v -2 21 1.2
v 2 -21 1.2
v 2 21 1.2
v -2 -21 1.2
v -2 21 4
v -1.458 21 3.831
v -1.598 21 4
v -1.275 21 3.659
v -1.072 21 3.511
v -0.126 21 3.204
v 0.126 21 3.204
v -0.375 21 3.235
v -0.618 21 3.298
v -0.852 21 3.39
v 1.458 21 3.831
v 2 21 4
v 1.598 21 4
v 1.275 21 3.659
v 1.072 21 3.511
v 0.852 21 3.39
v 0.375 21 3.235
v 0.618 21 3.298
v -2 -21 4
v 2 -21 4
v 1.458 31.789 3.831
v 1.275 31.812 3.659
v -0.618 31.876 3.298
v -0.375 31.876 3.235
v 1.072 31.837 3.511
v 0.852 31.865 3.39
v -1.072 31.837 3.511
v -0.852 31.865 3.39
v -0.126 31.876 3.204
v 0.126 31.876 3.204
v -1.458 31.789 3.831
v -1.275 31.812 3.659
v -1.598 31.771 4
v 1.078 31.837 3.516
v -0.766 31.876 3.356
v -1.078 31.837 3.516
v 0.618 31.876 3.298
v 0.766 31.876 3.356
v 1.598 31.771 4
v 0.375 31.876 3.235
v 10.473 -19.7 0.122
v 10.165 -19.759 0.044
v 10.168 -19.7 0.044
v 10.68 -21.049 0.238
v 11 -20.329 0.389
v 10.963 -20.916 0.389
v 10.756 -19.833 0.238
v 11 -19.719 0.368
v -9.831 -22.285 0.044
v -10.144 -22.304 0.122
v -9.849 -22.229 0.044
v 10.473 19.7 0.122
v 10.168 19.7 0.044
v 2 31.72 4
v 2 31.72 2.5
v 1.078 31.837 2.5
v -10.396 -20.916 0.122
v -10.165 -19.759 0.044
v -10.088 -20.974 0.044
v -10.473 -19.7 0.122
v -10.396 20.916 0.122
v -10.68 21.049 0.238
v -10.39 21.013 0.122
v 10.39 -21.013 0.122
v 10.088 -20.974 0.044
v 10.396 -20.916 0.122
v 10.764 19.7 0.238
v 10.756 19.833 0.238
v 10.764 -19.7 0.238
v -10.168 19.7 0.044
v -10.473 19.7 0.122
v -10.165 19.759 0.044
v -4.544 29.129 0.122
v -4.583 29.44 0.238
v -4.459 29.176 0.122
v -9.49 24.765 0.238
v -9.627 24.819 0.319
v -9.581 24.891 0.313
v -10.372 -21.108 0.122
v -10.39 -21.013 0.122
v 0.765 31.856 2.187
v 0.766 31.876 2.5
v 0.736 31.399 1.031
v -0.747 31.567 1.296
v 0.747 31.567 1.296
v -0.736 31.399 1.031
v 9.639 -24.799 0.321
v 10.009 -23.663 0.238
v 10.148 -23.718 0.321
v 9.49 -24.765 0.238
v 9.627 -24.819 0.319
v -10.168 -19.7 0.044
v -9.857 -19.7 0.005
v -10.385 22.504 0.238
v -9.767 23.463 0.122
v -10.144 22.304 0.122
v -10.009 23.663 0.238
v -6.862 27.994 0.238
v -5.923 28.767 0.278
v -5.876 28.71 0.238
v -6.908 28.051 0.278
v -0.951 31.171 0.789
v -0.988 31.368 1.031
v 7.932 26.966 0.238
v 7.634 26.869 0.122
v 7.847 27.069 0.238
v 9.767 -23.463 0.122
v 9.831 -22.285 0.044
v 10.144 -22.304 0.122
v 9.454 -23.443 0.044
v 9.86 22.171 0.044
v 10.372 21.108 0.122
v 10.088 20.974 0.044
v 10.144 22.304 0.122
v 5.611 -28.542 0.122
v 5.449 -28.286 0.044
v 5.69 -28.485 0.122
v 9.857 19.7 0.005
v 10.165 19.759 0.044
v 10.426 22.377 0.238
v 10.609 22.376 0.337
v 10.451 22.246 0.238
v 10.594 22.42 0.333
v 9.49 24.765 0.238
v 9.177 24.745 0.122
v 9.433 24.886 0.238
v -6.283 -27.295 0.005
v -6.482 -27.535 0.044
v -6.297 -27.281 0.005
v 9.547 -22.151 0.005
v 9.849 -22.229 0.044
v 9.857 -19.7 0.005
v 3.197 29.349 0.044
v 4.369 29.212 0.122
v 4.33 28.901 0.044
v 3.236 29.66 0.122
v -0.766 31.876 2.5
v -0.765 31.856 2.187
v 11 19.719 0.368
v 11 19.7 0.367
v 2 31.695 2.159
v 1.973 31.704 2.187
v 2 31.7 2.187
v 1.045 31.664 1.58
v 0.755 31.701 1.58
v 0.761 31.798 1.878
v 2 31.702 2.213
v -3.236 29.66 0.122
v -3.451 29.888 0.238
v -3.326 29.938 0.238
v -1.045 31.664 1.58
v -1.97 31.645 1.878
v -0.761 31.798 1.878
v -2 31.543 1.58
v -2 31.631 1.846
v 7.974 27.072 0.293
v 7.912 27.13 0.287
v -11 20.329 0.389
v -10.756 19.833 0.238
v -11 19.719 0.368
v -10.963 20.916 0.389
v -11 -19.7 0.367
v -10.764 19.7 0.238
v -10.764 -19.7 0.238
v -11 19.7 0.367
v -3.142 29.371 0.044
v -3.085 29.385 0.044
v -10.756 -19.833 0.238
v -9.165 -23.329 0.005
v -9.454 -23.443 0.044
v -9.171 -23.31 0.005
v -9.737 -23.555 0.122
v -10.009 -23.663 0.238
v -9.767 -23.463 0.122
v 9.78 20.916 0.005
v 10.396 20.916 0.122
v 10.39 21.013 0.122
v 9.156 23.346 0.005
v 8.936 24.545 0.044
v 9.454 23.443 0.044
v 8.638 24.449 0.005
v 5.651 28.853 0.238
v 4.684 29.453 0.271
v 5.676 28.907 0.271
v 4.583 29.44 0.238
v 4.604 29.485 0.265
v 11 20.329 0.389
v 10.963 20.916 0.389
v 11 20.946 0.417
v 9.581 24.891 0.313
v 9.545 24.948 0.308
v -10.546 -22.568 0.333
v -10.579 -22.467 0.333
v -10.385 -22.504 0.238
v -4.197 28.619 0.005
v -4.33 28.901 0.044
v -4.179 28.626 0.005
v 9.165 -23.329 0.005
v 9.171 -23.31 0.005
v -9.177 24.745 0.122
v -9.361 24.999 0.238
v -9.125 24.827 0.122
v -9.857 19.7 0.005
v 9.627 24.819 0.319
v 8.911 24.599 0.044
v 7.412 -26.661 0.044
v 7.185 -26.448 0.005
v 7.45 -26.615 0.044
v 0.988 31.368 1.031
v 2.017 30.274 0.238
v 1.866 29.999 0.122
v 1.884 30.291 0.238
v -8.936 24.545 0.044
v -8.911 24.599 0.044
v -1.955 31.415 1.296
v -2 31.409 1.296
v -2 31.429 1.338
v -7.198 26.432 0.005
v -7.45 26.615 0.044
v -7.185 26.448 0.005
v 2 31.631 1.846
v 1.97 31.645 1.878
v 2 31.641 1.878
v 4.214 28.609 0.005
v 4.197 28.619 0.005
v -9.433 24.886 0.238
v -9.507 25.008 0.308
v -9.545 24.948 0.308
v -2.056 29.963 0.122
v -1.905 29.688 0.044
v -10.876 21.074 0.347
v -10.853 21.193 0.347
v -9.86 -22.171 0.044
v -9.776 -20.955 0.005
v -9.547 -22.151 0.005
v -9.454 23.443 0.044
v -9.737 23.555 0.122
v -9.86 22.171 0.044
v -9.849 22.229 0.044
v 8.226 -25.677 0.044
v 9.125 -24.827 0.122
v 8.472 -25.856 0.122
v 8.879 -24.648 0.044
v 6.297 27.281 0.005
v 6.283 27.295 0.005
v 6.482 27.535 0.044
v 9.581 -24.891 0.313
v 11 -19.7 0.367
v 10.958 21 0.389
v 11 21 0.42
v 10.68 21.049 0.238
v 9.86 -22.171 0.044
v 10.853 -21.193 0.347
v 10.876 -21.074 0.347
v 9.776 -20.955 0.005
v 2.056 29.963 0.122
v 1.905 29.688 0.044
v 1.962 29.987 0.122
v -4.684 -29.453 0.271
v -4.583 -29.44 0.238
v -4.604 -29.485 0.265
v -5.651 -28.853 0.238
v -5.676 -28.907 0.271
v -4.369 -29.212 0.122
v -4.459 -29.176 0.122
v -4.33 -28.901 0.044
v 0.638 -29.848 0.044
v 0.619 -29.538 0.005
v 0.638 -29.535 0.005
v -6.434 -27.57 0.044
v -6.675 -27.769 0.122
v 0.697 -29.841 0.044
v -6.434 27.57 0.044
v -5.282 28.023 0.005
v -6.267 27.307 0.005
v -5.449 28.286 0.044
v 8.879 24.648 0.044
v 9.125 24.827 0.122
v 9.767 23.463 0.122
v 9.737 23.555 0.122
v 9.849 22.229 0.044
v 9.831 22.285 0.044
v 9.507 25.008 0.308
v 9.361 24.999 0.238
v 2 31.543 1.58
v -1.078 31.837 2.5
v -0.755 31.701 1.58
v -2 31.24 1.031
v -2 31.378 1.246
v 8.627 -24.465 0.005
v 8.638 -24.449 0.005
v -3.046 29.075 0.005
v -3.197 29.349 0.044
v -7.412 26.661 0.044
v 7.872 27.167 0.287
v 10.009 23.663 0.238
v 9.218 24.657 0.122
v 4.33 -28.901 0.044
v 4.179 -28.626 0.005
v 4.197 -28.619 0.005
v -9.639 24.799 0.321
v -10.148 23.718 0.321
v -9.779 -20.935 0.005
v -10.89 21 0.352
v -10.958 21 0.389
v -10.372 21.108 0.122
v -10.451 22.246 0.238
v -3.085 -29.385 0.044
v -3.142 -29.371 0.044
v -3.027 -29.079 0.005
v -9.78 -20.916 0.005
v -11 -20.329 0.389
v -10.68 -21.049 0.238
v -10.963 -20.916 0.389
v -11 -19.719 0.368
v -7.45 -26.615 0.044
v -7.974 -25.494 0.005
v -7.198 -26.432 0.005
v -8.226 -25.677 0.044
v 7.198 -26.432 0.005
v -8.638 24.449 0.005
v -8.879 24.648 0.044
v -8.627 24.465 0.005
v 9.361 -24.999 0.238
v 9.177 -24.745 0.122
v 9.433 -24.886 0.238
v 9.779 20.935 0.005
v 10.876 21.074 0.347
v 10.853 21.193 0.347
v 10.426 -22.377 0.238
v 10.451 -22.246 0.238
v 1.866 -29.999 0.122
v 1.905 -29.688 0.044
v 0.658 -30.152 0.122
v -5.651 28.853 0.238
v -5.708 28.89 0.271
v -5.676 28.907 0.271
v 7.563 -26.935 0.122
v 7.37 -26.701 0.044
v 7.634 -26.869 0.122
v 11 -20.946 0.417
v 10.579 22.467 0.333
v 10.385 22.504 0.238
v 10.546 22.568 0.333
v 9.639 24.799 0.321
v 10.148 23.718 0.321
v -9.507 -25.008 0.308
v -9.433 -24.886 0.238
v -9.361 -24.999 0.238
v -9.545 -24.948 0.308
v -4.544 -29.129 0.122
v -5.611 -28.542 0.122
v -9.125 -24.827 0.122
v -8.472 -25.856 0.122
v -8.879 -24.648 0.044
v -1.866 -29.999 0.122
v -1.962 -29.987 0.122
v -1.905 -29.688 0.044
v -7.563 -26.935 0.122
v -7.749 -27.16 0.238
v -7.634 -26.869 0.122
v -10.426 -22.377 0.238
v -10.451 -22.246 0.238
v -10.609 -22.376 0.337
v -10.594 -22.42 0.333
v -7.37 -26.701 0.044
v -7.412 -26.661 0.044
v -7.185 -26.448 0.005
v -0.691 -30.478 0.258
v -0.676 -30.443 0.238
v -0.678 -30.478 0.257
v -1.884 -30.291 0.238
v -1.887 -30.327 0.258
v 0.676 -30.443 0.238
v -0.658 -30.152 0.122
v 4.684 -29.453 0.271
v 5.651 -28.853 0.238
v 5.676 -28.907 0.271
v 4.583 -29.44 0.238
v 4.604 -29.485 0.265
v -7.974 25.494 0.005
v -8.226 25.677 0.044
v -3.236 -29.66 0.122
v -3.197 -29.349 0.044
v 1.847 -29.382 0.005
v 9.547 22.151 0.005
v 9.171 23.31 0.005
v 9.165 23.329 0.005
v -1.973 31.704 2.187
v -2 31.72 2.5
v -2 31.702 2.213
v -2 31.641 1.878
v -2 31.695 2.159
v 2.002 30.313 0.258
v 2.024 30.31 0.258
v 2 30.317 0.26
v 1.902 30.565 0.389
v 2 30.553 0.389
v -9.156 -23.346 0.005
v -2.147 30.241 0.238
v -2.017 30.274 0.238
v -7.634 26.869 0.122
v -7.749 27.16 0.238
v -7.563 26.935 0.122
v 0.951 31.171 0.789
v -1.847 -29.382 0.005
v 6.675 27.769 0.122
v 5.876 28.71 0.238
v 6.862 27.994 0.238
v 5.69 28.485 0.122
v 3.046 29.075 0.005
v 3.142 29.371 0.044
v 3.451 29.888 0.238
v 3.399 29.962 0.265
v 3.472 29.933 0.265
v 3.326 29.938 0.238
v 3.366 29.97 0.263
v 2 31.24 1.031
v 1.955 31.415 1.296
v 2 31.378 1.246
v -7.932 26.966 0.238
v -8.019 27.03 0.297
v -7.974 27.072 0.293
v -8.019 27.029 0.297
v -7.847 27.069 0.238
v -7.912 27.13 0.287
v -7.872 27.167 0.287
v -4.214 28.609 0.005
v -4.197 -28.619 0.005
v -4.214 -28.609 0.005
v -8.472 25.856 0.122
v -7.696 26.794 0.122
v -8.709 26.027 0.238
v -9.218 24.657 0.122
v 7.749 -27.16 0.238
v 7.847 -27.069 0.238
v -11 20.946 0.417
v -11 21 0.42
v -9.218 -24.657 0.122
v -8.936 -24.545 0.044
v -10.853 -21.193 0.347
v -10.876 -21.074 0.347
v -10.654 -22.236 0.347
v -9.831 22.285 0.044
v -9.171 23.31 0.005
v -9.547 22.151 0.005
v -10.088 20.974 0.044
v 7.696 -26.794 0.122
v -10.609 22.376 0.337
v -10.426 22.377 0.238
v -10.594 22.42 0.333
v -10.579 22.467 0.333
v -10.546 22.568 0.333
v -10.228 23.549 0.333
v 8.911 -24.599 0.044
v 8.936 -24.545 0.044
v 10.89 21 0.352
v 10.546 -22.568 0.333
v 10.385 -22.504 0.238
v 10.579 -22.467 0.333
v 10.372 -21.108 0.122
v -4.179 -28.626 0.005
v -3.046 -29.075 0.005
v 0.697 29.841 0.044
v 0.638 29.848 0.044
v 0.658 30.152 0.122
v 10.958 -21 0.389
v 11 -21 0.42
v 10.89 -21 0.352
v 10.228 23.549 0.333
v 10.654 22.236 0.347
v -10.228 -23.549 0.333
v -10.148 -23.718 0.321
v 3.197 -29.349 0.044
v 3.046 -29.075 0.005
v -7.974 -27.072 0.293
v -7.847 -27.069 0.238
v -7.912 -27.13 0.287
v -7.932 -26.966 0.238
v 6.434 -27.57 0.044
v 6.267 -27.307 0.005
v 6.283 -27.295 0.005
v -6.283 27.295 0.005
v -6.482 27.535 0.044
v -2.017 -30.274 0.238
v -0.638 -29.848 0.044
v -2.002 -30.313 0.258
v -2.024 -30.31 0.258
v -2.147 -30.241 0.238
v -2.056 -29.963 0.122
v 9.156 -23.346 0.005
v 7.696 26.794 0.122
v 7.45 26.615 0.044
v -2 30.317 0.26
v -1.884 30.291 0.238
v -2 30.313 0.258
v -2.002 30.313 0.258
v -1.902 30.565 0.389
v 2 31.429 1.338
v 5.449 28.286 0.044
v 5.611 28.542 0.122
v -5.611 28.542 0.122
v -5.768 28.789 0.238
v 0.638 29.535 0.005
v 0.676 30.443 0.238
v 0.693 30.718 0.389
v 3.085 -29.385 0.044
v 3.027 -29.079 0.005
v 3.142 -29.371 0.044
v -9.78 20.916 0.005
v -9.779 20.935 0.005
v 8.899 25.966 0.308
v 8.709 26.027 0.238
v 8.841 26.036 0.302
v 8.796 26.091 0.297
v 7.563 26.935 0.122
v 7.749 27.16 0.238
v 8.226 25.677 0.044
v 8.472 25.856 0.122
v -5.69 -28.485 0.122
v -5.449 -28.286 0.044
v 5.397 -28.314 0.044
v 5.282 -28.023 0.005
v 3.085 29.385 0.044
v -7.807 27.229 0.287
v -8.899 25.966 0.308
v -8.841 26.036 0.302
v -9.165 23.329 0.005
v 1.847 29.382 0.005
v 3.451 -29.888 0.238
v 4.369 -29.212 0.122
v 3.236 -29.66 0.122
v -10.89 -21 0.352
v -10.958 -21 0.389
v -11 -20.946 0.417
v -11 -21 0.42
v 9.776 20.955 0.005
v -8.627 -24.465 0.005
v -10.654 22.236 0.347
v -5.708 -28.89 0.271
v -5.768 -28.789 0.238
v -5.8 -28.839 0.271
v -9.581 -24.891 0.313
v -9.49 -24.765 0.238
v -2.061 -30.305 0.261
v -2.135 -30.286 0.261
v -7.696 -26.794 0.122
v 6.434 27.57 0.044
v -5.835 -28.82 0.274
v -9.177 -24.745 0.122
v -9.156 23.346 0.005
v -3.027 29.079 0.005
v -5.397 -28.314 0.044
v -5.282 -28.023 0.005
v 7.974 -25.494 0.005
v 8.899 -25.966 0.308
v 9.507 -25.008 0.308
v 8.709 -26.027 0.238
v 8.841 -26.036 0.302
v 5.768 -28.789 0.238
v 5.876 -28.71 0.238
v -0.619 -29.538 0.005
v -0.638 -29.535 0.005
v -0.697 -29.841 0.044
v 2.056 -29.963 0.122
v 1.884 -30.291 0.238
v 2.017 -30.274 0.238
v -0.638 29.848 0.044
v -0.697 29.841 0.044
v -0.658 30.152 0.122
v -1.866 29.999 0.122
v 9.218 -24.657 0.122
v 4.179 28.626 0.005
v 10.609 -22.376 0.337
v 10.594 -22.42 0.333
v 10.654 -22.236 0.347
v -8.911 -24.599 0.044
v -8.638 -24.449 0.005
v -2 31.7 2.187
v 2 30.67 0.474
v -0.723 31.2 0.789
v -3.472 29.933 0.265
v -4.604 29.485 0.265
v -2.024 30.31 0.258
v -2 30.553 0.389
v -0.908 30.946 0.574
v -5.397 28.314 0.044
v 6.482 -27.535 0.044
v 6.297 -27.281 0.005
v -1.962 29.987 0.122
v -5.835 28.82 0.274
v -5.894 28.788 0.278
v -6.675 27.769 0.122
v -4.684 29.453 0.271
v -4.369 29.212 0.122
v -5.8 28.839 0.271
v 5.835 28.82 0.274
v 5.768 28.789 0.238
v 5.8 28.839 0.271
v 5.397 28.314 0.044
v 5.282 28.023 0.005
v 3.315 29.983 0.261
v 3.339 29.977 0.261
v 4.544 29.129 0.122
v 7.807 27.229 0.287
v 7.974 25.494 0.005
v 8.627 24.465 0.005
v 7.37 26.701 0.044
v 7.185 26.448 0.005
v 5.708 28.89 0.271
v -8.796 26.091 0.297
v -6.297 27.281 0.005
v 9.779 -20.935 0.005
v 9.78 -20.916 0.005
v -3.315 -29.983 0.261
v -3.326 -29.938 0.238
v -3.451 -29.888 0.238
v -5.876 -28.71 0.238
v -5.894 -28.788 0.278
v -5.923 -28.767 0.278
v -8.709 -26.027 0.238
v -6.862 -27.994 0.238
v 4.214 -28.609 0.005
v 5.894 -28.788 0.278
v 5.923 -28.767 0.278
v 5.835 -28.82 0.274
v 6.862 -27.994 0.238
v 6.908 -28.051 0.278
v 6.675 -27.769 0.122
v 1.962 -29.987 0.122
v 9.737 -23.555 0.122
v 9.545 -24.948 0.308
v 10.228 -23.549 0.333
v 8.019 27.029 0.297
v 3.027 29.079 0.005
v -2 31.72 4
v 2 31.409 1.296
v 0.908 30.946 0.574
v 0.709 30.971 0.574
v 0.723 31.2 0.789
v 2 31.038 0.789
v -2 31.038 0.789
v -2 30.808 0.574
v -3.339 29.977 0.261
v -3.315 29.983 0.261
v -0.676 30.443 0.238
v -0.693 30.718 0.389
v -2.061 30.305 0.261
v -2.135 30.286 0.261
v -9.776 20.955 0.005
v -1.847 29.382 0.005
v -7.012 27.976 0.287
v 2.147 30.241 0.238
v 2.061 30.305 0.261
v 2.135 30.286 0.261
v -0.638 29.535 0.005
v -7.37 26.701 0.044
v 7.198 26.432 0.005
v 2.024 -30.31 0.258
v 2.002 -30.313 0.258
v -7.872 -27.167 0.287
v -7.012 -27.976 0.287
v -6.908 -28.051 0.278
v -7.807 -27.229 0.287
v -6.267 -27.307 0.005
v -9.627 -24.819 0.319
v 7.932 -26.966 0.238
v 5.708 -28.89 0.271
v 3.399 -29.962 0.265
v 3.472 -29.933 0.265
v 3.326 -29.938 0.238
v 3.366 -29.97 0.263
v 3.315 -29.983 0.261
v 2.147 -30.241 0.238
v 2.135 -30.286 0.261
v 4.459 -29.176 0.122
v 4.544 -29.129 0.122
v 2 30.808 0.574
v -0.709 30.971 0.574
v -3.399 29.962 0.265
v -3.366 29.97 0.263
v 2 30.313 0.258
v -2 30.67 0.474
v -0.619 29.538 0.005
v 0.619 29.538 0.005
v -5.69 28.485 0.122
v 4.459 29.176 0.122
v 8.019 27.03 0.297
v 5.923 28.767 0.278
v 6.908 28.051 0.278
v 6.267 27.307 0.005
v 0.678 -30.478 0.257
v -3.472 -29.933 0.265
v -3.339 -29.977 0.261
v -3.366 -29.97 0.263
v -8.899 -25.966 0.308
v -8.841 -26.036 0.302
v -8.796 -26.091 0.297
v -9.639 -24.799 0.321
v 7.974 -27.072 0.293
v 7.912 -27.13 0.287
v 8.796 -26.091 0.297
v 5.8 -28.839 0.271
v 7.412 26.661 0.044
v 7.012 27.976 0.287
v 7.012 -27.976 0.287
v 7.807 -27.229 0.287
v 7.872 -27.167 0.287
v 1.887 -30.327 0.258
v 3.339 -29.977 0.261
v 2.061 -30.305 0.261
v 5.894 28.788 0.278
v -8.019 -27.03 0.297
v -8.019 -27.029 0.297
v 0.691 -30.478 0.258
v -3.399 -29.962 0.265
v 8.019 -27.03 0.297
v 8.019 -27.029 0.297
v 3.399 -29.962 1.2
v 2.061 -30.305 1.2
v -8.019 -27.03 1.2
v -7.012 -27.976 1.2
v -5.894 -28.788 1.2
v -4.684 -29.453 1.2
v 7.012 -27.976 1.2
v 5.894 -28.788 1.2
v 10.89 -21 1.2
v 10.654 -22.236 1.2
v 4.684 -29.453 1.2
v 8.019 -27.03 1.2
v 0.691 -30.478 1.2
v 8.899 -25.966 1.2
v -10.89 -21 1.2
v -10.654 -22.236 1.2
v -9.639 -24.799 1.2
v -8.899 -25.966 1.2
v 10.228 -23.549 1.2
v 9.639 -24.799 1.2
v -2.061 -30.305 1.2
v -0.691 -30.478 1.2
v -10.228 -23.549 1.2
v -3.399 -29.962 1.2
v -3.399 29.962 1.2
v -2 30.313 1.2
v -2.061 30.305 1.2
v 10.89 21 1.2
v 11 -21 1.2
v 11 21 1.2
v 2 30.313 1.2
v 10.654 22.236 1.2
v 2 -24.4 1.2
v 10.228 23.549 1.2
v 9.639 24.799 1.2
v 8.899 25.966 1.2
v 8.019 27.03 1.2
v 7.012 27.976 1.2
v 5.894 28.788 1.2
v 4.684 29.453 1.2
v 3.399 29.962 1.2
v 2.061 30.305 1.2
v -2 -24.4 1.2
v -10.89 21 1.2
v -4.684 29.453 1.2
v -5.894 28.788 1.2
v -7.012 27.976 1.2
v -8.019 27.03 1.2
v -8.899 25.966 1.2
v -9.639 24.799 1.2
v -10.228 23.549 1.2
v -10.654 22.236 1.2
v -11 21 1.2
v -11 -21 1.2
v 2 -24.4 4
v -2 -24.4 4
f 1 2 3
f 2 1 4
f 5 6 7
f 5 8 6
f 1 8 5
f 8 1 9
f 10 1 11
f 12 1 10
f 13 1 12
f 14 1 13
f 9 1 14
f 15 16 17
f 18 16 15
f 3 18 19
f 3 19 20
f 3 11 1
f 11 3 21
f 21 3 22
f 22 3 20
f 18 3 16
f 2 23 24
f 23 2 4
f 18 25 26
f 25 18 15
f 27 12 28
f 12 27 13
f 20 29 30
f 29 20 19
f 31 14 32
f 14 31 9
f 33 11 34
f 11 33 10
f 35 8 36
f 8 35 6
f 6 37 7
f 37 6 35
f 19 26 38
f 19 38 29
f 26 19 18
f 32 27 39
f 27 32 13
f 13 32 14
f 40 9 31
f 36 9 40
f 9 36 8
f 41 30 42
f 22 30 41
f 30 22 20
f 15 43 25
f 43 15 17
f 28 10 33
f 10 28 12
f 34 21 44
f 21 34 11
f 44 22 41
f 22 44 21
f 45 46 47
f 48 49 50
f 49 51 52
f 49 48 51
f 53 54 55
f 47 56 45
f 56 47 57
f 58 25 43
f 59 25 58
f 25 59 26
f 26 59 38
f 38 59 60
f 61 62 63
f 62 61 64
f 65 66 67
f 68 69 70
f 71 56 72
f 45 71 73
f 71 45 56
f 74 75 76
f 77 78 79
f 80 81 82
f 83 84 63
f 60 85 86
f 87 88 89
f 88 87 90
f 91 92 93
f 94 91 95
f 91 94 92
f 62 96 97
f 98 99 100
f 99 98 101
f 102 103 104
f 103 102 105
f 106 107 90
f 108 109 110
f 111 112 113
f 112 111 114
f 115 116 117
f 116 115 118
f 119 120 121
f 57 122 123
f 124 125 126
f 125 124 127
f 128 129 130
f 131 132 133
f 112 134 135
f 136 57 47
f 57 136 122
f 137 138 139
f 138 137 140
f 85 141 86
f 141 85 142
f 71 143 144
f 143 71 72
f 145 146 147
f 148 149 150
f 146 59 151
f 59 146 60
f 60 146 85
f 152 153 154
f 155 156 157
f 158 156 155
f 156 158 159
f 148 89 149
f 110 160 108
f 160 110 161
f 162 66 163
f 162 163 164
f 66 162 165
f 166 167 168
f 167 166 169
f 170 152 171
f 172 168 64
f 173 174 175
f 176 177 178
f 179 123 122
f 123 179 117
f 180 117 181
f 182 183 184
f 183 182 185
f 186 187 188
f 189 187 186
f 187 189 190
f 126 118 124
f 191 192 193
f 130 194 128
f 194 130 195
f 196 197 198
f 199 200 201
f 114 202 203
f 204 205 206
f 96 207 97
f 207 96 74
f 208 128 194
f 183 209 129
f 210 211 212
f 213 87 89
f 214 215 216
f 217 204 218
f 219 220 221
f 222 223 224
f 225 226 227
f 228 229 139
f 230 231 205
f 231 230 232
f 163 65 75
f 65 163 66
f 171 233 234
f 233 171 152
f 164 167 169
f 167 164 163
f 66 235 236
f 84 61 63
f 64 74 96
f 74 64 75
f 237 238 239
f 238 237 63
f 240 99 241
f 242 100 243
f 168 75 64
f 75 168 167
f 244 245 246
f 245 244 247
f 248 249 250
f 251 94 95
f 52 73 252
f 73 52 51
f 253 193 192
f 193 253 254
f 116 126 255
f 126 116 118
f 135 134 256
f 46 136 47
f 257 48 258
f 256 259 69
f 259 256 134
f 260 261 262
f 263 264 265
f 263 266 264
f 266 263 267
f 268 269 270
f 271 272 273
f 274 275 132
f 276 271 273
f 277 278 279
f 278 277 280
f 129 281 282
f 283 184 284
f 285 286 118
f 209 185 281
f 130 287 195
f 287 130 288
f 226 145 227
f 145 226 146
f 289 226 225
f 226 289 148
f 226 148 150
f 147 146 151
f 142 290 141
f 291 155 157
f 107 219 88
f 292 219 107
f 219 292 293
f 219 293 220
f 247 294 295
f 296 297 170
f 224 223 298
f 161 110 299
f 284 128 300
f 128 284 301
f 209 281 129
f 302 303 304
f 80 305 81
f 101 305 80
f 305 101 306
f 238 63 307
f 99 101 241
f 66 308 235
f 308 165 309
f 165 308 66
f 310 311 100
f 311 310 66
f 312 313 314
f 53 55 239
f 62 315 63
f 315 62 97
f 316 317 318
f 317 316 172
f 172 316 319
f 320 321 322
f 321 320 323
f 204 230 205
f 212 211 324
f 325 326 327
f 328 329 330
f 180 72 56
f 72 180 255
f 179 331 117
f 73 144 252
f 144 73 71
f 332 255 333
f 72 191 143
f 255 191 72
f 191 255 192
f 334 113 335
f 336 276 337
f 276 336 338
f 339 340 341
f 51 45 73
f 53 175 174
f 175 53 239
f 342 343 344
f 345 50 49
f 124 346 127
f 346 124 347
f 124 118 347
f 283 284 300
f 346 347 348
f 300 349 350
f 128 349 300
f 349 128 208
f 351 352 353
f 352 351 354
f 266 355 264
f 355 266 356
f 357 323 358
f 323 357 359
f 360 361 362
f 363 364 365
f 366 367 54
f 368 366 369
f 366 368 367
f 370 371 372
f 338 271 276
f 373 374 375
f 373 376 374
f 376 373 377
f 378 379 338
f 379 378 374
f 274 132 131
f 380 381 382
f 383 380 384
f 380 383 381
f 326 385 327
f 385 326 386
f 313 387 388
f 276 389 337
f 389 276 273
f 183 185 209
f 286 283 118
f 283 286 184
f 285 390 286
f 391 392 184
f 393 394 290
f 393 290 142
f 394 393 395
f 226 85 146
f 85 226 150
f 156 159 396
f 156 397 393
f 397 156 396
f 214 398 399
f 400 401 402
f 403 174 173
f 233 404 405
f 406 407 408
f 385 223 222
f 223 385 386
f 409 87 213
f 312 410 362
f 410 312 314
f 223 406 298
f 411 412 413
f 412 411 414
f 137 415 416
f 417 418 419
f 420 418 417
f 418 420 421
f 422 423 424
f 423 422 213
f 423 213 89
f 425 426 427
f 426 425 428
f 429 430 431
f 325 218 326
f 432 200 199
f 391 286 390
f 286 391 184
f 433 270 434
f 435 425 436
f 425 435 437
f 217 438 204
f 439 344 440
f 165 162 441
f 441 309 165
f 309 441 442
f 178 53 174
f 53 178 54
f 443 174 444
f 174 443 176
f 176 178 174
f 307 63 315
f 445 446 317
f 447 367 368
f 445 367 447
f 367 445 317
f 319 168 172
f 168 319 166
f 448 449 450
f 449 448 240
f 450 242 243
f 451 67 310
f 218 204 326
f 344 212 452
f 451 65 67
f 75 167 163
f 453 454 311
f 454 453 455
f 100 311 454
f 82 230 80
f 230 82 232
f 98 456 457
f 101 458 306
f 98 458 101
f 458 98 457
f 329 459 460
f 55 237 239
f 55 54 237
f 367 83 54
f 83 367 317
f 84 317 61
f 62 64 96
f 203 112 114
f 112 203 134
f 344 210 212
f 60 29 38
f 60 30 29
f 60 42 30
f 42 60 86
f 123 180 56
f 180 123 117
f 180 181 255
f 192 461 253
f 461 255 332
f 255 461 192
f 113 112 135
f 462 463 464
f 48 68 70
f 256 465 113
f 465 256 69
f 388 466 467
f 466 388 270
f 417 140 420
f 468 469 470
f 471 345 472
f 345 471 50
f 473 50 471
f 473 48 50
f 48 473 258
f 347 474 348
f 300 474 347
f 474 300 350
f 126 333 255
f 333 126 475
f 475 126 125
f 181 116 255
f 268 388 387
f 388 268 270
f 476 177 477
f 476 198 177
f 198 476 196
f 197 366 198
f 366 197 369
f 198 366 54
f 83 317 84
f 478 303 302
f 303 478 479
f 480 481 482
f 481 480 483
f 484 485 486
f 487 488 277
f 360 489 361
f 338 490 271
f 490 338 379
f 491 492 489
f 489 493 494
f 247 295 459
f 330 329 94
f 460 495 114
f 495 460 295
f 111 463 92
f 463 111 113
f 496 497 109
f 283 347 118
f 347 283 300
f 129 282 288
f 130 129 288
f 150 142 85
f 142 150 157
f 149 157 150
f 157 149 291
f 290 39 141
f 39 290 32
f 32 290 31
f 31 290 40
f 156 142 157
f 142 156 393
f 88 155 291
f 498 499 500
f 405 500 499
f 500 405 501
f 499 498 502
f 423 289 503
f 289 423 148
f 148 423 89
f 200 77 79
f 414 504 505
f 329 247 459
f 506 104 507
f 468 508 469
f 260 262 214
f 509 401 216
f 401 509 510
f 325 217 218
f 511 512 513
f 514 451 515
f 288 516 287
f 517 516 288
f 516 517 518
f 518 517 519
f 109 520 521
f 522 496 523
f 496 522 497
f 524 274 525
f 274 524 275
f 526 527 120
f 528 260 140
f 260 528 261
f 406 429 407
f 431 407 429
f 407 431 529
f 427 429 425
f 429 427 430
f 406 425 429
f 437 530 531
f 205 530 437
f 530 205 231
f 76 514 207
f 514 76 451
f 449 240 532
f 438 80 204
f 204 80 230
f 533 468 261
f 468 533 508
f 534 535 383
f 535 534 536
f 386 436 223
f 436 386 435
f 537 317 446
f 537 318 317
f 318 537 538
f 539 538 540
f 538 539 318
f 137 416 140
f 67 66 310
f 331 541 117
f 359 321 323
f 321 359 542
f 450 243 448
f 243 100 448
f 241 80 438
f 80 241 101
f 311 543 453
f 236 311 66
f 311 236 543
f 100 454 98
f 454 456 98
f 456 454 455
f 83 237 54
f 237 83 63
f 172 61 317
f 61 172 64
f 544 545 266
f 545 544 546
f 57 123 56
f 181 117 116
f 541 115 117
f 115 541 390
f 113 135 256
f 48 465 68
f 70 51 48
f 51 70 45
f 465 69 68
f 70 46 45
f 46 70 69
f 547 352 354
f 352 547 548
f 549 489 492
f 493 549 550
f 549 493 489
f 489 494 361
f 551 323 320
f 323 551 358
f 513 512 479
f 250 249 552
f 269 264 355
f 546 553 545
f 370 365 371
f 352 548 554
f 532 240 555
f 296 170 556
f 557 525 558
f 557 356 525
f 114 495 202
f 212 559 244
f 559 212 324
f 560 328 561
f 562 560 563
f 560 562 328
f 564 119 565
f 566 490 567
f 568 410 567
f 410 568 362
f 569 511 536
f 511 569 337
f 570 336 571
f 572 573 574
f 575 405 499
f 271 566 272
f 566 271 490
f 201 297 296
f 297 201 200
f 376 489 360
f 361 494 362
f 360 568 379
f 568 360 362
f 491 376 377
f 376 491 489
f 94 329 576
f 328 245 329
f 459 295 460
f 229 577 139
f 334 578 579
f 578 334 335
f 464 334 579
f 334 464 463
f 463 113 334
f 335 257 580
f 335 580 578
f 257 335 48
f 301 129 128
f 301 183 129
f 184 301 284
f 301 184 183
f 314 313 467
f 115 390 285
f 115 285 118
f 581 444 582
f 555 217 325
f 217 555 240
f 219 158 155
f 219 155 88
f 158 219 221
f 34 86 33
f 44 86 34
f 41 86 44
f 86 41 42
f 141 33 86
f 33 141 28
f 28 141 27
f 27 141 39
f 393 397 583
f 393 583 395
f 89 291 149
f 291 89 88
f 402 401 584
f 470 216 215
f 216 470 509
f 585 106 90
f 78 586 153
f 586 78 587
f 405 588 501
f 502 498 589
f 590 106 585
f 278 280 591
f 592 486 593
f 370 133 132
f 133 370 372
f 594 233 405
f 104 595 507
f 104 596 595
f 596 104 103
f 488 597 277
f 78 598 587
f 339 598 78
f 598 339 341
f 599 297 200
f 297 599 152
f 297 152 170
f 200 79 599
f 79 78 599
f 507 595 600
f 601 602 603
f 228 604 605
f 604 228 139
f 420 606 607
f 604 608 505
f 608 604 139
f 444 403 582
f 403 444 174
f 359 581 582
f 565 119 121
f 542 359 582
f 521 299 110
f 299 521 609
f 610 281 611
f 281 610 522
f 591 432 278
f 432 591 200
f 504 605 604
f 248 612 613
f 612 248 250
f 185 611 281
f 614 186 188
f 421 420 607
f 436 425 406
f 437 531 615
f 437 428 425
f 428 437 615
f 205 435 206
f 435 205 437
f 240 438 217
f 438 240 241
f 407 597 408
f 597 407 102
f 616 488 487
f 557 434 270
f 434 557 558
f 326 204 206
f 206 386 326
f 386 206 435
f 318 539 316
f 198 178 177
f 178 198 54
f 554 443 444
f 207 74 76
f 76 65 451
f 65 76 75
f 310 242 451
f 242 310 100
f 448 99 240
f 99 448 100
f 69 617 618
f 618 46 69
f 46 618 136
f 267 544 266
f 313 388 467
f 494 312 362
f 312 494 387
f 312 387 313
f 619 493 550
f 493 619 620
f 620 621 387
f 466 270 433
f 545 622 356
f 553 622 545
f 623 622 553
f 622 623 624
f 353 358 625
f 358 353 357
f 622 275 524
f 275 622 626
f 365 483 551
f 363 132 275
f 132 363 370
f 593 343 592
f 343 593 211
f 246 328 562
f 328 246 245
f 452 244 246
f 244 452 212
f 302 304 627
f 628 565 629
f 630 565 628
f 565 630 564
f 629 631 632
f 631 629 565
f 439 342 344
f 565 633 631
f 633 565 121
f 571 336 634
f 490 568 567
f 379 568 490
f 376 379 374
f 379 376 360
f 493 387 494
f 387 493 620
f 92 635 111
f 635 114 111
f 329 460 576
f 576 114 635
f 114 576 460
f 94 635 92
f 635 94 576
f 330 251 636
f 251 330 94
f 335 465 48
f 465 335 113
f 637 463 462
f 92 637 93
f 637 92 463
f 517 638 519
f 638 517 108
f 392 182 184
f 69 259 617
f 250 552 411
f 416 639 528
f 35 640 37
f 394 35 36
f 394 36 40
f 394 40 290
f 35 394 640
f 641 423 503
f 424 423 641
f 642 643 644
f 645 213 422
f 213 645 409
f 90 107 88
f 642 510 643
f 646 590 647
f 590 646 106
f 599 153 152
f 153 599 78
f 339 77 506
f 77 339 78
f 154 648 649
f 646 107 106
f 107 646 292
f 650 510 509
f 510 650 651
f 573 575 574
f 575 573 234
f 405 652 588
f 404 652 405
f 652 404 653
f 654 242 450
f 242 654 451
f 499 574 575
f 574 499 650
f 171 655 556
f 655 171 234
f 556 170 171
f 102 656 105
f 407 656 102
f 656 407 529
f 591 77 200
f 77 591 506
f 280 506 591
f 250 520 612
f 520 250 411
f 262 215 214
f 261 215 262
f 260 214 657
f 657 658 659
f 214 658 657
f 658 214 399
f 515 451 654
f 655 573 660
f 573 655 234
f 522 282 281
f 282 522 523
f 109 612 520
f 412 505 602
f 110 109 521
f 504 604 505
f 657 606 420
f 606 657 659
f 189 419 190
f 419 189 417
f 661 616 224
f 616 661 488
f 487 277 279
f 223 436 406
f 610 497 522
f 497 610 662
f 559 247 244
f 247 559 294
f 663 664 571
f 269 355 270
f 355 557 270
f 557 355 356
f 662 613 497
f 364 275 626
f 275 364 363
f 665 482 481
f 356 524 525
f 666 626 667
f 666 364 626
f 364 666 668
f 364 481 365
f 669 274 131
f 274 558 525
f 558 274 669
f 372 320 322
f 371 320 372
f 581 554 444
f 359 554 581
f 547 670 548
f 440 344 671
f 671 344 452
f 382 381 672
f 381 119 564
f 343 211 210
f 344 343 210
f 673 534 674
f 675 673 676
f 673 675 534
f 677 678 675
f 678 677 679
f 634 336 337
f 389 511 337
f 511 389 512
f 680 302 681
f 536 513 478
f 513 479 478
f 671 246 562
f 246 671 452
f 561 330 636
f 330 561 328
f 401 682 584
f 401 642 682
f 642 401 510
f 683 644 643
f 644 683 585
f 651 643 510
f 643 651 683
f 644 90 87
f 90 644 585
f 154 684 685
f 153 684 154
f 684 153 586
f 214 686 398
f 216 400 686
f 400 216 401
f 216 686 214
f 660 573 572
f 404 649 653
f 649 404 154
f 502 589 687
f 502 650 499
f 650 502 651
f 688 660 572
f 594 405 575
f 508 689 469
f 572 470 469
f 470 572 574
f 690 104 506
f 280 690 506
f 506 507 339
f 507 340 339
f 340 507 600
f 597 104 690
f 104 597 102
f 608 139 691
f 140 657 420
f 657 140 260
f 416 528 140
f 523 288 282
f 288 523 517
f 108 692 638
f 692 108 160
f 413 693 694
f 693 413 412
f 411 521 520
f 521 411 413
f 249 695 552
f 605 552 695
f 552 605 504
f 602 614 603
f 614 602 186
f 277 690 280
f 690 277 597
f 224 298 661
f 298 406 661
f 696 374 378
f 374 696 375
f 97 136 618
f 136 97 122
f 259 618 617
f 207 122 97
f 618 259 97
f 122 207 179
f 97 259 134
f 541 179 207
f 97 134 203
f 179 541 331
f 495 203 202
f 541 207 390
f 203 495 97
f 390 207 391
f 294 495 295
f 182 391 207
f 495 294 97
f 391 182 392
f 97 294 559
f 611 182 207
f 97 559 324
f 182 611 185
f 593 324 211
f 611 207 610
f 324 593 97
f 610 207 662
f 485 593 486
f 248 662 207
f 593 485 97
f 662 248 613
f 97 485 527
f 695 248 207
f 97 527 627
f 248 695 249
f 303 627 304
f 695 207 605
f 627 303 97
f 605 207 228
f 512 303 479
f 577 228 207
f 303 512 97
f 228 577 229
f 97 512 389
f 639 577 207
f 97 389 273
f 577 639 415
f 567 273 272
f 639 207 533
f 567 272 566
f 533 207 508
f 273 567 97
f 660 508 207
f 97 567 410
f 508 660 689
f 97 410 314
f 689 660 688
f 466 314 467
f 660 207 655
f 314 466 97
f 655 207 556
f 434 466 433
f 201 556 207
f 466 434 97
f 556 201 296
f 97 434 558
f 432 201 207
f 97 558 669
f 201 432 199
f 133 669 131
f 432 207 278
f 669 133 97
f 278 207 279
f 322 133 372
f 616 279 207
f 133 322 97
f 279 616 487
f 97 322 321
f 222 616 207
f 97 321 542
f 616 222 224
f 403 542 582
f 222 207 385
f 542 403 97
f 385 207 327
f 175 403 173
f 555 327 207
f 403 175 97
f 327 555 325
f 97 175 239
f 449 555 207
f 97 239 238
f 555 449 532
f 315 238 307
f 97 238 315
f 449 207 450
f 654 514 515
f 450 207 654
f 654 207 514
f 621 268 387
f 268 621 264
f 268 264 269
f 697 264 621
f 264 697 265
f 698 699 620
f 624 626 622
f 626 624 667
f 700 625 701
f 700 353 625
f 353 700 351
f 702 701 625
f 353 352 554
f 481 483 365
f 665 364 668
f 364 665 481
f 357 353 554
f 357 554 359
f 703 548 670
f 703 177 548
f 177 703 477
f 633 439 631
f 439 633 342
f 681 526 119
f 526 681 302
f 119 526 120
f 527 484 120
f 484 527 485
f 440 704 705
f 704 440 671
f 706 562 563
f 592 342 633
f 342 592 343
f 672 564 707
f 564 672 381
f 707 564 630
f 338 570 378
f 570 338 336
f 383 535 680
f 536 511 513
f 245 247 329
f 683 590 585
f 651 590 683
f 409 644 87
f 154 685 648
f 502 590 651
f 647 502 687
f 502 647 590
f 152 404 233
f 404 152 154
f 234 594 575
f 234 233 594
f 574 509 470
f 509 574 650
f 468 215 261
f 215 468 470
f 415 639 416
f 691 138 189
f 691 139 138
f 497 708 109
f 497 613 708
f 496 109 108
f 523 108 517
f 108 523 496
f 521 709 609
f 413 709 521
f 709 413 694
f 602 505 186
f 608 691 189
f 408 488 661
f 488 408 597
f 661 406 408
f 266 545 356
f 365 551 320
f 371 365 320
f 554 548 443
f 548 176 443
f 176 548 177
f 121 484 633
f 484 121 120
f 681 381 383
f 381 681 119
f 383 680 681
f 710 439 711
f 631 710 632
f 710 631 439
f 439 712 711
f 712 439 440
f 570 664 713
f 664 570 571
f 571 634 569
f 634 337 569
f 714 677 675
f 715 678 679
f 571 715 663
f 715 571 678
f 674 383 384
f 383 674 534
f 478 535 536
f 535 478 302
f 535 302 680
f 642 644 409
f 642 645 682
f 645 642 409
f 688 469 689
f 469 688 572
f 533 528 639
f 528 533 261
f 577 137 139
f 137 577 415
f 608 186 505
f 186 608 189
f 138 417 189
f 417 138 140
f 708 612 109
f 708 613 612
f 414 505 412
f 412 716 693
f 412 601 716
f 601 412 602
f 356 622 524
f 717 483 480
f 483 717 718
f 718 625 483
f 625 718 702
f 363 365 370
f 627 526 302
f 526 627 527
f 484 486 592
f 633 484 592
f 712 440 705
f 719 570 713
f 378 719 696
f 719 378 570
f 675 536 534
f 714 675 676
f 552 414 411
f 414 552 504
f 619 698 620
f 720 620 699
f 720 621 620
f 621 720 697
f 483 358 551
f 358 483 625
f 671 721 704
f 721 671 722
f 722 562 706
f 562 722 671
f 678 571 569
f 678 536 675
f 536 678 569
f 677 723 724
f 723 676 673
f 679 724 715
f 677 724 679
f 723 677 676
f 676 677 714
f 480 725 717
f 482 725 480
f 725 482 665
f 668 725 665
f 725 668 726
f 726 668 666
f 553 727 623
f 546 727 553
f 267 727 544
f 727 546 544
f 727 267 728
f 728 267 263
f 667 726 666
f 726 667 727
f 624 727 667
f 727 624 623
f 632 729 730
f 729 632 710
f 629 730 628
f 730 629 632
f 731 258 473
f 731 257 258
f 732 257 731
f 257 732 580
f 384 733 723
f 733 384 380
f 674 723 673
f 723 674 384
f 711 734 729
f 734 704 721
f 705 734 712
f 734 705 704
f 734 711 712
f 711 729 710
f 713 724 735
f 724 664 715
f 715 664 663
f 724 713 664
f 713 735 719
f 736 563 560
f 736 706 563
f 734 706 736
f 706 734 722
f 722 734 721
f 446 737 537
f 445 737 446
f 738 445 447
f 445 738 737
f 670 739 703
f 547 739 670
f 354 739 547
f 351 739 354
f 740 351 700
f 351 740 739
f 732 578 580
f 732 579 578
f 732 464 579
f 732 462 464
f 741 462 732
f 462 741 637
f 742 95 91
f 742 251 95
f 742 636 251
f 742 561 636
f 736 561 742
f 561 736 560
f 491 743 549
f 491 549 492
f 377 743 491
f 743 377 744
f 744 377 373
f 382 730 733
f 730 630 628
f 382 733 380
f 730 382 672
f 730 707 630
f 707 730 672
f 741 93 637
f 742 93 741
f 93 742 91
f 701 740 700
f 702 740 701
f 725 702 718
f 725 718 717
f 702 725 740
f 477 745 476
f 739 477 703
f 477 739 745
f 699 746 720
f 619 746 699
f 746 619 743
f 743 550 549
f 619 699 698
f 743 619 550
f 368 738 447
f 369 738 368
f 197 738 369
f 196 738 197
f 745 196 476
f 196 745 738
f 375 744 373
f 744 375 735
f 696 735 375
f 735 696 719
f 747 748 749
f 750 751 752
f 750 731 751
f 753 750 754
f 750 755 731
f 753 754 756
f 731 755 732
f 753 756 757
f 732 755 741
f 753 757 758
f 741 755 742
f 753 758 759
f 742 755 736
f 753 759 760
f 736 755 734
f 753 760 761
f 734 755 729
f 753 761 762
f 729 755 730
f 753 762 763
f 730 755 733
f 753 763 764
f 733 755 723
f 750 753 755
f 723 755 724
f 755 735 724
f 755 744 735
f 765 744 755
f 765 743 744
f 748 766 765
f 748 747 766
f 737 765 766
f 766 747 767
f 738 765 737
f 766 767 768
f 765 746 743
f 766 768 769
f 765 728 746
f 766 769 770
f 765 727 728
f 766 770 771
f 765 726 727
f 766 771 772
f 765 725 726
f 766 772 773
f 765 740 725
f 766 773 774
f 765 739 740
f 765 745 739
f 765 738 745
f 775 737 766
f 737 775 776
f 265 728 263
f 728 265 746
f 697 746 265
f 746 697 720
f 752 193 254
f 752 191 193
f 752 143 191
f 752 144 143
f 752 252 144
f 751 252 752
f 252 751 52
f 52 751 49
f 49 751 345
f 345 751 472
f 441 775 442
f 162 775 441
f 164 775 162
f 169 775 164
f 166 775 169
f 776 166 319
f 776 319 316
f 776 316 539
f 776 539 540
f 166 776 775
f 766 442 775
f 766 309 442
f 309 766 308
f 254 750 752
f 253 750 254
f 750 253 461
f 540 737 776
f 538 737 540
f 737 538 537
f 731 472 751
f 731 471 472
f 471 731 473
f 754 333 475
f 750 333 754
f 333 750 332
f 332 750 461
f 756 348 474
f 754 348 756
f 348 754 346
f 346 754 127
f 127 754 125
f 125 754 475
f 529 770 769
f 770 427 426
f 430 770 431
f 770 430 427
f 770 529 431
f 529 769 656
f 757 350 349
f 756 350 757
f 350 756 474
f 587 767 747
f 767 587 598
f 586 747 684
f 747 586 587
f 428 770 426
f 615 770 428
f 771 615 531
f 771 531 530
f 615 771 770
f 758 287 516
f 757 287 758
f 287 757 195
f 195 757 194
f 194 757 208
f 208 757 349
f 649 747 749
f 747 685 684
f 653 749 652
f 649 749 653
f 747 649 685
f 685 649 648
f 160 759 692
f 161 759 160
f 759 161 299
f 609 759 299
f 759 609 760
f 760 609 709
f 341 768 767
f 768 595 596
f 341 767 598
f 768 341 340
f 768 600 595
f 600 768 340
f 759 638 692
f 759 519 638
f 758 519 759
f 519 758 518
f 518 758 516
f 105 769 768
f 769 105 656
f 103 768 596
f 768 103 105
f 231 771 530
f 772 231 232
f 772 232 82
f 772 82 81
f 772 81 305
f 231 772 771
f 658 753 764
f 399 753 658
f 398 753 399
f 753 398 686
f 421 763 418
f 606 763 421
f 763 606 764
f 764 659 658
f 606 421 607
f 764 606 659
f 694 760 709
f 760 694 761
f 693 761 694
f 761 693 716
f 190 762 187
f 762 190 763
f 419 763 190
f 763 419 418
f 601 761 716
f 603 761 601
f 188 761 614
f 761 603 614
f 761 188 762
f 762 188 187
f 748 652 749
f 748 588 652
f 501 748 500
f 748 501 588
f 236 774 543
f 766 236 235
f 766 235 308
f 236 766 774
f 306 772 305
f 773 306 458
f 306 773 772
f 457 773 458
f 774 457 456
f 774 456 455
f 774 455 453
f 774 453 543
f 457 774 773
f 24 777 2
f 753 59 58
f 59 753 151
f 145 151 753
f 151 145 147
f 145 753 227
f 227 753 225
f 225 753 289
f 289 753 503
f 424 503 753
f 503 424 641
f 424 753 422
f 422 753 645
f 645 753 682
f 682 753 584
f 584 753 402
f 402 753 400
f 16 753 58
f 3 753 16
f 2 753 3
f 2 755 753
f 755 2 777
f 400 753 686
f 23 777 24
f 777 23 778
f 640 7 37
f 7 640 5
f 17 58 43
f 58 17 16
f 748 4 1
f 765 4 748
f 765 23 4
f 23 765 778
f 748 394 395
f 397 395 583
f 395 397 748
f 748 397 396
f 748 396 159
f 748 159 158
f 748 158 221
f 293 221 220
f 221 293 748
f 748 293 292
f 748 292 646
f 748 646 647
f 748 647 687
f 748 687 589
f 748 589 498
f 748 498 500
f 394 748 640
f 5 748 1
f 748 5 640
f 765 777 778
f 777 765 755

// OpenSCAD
SENSOR_WIDTH = 22;
SENSOR_LENGTH = 42; //62;
SENSOR_HEIGHT = 13;
CABLE_DIA = 4;
CABLE_HEIGHT = 2;

WALL_THICKNESS = 1.2;
WIDTH = SENSOR_WIDTH + 2 * WALL_THICKNESS;
LENGTH = SENSOR_LENGTH + 2 * WALL_THICKNESS;
HEIGHT = SENSOR_HEIGHT + 2 * WALL_THICKNESS;
CORNER_DIA = 5;

MOUNT_HOLES = false;
MOUNT_HOLE_DIA = 2.5;
MOUNT_HOLE_HEAD_DIA = 2.5;
MOUNT_HOLE_SPACING = 10;

VENT_HOLE_DIA = 3;
VENT_HOLE_SPACING = 7;
VENT_HOLES = round(SENSOR_LENGTH/2/VENT_HOLE_SPACING);
$fn = 50;

module sensor() {
    translate([-SENSOR_WIDTH/2, -SENSOR_LENGTH/2, 0])
    cube(size = [SENSOR_WIDTH, SENSOR_LENGTH, SENSOR_HEIGHT]);

    translate([0, 0, CABLE_HEIGHT + CABLE_DIA/2])
    rotate([-90, 0, 0])
    cylinder(d = CABLE_DIA, h = SENSOR_LENGTH);
}

module base() {
    translate([0, 0, CORNER_DIA/2])
    minkowski() {
        sphere(d = CORNER_DIA);
        union() {
            w = WIDTH - CORNER_DIA;
            l = LENGTH - CORNER_DIA;
            h = HEIGHT - CORNER_DIA;
            translate([0, -l/2, 0])
            cylinder(d = w, h = h);
            translate([-w/2, -l/2, 0])
            cube(size = [w, l, h]);
            translate([0, l/2, 0])
            cylinder(d = w, h = h);
        }
    }
}

module mount_holes() {
    for(i = [-1, 1]) {
        for(j = [-1, 1]) {
            translate([i * MOUNT_HOLE_SPACING/2, j * LENGTH/2, 0]) {
                cylinder(d = MOUNT_HOLE_DIA, h = HEIGHT - WALL_THICKNESS);
                cylinder(d = MOUNT_HOLE_HEAD_DIA, h = WALL_THICKNESS/2);
            }
        }
    }
}

module vent_holes() {
    for(i = [0 : VENT_HOLES-1]) {
        translate([0, -i * VENT_HOLE_SPACING, 0])
        cylinder(d = VENT_HOLE_DIA, h = HEIGHT);
    }
}

module case() {
    difference() {
        base();
        #translate([0, 0, WALL_THICKNESS])
        sensor();

        if(MOUNT_HOLES) {
            #mount_holes();
        }

        #translate([0, 0, WALL_THICKNESS])
        vent_holes();
    }
}

module bot_mask() {
    delta = 1.5;
    union() {
        translate([0, -SENSOR_LENGTH/2 + delta, 0])
        cylinder(d = SENSOR_WIDTH, h = WALL_THICKNESS);
        translate([-SENSOR_WIDTH/2, -SENSOR_LENGTH/2, 0])
        cube(size = [SENSOR_WIDTH, SENSOR_LENGTH, WALL_THICKNESS]);
        translate([0, SENSOR_LENGTH/2 - delta, 0])
        cylinder(d = SENSOR_WIDTH, h = WALL_THICKNESS);

        l = LENGTH + WIDTH;
        translate([-CABLE_DIA/2, -l/2 + MOUNT_HOLE_SPACING, 0])
        cube(size = [CABLE_DIA, l, CABLE_HEIGHT + CABLE_DIA/2]);
    }
}

// Bottom
!intersection() {
    case();
    bot_mask();
}

// Top
difference() {
    case();
    bot_mask();
}
